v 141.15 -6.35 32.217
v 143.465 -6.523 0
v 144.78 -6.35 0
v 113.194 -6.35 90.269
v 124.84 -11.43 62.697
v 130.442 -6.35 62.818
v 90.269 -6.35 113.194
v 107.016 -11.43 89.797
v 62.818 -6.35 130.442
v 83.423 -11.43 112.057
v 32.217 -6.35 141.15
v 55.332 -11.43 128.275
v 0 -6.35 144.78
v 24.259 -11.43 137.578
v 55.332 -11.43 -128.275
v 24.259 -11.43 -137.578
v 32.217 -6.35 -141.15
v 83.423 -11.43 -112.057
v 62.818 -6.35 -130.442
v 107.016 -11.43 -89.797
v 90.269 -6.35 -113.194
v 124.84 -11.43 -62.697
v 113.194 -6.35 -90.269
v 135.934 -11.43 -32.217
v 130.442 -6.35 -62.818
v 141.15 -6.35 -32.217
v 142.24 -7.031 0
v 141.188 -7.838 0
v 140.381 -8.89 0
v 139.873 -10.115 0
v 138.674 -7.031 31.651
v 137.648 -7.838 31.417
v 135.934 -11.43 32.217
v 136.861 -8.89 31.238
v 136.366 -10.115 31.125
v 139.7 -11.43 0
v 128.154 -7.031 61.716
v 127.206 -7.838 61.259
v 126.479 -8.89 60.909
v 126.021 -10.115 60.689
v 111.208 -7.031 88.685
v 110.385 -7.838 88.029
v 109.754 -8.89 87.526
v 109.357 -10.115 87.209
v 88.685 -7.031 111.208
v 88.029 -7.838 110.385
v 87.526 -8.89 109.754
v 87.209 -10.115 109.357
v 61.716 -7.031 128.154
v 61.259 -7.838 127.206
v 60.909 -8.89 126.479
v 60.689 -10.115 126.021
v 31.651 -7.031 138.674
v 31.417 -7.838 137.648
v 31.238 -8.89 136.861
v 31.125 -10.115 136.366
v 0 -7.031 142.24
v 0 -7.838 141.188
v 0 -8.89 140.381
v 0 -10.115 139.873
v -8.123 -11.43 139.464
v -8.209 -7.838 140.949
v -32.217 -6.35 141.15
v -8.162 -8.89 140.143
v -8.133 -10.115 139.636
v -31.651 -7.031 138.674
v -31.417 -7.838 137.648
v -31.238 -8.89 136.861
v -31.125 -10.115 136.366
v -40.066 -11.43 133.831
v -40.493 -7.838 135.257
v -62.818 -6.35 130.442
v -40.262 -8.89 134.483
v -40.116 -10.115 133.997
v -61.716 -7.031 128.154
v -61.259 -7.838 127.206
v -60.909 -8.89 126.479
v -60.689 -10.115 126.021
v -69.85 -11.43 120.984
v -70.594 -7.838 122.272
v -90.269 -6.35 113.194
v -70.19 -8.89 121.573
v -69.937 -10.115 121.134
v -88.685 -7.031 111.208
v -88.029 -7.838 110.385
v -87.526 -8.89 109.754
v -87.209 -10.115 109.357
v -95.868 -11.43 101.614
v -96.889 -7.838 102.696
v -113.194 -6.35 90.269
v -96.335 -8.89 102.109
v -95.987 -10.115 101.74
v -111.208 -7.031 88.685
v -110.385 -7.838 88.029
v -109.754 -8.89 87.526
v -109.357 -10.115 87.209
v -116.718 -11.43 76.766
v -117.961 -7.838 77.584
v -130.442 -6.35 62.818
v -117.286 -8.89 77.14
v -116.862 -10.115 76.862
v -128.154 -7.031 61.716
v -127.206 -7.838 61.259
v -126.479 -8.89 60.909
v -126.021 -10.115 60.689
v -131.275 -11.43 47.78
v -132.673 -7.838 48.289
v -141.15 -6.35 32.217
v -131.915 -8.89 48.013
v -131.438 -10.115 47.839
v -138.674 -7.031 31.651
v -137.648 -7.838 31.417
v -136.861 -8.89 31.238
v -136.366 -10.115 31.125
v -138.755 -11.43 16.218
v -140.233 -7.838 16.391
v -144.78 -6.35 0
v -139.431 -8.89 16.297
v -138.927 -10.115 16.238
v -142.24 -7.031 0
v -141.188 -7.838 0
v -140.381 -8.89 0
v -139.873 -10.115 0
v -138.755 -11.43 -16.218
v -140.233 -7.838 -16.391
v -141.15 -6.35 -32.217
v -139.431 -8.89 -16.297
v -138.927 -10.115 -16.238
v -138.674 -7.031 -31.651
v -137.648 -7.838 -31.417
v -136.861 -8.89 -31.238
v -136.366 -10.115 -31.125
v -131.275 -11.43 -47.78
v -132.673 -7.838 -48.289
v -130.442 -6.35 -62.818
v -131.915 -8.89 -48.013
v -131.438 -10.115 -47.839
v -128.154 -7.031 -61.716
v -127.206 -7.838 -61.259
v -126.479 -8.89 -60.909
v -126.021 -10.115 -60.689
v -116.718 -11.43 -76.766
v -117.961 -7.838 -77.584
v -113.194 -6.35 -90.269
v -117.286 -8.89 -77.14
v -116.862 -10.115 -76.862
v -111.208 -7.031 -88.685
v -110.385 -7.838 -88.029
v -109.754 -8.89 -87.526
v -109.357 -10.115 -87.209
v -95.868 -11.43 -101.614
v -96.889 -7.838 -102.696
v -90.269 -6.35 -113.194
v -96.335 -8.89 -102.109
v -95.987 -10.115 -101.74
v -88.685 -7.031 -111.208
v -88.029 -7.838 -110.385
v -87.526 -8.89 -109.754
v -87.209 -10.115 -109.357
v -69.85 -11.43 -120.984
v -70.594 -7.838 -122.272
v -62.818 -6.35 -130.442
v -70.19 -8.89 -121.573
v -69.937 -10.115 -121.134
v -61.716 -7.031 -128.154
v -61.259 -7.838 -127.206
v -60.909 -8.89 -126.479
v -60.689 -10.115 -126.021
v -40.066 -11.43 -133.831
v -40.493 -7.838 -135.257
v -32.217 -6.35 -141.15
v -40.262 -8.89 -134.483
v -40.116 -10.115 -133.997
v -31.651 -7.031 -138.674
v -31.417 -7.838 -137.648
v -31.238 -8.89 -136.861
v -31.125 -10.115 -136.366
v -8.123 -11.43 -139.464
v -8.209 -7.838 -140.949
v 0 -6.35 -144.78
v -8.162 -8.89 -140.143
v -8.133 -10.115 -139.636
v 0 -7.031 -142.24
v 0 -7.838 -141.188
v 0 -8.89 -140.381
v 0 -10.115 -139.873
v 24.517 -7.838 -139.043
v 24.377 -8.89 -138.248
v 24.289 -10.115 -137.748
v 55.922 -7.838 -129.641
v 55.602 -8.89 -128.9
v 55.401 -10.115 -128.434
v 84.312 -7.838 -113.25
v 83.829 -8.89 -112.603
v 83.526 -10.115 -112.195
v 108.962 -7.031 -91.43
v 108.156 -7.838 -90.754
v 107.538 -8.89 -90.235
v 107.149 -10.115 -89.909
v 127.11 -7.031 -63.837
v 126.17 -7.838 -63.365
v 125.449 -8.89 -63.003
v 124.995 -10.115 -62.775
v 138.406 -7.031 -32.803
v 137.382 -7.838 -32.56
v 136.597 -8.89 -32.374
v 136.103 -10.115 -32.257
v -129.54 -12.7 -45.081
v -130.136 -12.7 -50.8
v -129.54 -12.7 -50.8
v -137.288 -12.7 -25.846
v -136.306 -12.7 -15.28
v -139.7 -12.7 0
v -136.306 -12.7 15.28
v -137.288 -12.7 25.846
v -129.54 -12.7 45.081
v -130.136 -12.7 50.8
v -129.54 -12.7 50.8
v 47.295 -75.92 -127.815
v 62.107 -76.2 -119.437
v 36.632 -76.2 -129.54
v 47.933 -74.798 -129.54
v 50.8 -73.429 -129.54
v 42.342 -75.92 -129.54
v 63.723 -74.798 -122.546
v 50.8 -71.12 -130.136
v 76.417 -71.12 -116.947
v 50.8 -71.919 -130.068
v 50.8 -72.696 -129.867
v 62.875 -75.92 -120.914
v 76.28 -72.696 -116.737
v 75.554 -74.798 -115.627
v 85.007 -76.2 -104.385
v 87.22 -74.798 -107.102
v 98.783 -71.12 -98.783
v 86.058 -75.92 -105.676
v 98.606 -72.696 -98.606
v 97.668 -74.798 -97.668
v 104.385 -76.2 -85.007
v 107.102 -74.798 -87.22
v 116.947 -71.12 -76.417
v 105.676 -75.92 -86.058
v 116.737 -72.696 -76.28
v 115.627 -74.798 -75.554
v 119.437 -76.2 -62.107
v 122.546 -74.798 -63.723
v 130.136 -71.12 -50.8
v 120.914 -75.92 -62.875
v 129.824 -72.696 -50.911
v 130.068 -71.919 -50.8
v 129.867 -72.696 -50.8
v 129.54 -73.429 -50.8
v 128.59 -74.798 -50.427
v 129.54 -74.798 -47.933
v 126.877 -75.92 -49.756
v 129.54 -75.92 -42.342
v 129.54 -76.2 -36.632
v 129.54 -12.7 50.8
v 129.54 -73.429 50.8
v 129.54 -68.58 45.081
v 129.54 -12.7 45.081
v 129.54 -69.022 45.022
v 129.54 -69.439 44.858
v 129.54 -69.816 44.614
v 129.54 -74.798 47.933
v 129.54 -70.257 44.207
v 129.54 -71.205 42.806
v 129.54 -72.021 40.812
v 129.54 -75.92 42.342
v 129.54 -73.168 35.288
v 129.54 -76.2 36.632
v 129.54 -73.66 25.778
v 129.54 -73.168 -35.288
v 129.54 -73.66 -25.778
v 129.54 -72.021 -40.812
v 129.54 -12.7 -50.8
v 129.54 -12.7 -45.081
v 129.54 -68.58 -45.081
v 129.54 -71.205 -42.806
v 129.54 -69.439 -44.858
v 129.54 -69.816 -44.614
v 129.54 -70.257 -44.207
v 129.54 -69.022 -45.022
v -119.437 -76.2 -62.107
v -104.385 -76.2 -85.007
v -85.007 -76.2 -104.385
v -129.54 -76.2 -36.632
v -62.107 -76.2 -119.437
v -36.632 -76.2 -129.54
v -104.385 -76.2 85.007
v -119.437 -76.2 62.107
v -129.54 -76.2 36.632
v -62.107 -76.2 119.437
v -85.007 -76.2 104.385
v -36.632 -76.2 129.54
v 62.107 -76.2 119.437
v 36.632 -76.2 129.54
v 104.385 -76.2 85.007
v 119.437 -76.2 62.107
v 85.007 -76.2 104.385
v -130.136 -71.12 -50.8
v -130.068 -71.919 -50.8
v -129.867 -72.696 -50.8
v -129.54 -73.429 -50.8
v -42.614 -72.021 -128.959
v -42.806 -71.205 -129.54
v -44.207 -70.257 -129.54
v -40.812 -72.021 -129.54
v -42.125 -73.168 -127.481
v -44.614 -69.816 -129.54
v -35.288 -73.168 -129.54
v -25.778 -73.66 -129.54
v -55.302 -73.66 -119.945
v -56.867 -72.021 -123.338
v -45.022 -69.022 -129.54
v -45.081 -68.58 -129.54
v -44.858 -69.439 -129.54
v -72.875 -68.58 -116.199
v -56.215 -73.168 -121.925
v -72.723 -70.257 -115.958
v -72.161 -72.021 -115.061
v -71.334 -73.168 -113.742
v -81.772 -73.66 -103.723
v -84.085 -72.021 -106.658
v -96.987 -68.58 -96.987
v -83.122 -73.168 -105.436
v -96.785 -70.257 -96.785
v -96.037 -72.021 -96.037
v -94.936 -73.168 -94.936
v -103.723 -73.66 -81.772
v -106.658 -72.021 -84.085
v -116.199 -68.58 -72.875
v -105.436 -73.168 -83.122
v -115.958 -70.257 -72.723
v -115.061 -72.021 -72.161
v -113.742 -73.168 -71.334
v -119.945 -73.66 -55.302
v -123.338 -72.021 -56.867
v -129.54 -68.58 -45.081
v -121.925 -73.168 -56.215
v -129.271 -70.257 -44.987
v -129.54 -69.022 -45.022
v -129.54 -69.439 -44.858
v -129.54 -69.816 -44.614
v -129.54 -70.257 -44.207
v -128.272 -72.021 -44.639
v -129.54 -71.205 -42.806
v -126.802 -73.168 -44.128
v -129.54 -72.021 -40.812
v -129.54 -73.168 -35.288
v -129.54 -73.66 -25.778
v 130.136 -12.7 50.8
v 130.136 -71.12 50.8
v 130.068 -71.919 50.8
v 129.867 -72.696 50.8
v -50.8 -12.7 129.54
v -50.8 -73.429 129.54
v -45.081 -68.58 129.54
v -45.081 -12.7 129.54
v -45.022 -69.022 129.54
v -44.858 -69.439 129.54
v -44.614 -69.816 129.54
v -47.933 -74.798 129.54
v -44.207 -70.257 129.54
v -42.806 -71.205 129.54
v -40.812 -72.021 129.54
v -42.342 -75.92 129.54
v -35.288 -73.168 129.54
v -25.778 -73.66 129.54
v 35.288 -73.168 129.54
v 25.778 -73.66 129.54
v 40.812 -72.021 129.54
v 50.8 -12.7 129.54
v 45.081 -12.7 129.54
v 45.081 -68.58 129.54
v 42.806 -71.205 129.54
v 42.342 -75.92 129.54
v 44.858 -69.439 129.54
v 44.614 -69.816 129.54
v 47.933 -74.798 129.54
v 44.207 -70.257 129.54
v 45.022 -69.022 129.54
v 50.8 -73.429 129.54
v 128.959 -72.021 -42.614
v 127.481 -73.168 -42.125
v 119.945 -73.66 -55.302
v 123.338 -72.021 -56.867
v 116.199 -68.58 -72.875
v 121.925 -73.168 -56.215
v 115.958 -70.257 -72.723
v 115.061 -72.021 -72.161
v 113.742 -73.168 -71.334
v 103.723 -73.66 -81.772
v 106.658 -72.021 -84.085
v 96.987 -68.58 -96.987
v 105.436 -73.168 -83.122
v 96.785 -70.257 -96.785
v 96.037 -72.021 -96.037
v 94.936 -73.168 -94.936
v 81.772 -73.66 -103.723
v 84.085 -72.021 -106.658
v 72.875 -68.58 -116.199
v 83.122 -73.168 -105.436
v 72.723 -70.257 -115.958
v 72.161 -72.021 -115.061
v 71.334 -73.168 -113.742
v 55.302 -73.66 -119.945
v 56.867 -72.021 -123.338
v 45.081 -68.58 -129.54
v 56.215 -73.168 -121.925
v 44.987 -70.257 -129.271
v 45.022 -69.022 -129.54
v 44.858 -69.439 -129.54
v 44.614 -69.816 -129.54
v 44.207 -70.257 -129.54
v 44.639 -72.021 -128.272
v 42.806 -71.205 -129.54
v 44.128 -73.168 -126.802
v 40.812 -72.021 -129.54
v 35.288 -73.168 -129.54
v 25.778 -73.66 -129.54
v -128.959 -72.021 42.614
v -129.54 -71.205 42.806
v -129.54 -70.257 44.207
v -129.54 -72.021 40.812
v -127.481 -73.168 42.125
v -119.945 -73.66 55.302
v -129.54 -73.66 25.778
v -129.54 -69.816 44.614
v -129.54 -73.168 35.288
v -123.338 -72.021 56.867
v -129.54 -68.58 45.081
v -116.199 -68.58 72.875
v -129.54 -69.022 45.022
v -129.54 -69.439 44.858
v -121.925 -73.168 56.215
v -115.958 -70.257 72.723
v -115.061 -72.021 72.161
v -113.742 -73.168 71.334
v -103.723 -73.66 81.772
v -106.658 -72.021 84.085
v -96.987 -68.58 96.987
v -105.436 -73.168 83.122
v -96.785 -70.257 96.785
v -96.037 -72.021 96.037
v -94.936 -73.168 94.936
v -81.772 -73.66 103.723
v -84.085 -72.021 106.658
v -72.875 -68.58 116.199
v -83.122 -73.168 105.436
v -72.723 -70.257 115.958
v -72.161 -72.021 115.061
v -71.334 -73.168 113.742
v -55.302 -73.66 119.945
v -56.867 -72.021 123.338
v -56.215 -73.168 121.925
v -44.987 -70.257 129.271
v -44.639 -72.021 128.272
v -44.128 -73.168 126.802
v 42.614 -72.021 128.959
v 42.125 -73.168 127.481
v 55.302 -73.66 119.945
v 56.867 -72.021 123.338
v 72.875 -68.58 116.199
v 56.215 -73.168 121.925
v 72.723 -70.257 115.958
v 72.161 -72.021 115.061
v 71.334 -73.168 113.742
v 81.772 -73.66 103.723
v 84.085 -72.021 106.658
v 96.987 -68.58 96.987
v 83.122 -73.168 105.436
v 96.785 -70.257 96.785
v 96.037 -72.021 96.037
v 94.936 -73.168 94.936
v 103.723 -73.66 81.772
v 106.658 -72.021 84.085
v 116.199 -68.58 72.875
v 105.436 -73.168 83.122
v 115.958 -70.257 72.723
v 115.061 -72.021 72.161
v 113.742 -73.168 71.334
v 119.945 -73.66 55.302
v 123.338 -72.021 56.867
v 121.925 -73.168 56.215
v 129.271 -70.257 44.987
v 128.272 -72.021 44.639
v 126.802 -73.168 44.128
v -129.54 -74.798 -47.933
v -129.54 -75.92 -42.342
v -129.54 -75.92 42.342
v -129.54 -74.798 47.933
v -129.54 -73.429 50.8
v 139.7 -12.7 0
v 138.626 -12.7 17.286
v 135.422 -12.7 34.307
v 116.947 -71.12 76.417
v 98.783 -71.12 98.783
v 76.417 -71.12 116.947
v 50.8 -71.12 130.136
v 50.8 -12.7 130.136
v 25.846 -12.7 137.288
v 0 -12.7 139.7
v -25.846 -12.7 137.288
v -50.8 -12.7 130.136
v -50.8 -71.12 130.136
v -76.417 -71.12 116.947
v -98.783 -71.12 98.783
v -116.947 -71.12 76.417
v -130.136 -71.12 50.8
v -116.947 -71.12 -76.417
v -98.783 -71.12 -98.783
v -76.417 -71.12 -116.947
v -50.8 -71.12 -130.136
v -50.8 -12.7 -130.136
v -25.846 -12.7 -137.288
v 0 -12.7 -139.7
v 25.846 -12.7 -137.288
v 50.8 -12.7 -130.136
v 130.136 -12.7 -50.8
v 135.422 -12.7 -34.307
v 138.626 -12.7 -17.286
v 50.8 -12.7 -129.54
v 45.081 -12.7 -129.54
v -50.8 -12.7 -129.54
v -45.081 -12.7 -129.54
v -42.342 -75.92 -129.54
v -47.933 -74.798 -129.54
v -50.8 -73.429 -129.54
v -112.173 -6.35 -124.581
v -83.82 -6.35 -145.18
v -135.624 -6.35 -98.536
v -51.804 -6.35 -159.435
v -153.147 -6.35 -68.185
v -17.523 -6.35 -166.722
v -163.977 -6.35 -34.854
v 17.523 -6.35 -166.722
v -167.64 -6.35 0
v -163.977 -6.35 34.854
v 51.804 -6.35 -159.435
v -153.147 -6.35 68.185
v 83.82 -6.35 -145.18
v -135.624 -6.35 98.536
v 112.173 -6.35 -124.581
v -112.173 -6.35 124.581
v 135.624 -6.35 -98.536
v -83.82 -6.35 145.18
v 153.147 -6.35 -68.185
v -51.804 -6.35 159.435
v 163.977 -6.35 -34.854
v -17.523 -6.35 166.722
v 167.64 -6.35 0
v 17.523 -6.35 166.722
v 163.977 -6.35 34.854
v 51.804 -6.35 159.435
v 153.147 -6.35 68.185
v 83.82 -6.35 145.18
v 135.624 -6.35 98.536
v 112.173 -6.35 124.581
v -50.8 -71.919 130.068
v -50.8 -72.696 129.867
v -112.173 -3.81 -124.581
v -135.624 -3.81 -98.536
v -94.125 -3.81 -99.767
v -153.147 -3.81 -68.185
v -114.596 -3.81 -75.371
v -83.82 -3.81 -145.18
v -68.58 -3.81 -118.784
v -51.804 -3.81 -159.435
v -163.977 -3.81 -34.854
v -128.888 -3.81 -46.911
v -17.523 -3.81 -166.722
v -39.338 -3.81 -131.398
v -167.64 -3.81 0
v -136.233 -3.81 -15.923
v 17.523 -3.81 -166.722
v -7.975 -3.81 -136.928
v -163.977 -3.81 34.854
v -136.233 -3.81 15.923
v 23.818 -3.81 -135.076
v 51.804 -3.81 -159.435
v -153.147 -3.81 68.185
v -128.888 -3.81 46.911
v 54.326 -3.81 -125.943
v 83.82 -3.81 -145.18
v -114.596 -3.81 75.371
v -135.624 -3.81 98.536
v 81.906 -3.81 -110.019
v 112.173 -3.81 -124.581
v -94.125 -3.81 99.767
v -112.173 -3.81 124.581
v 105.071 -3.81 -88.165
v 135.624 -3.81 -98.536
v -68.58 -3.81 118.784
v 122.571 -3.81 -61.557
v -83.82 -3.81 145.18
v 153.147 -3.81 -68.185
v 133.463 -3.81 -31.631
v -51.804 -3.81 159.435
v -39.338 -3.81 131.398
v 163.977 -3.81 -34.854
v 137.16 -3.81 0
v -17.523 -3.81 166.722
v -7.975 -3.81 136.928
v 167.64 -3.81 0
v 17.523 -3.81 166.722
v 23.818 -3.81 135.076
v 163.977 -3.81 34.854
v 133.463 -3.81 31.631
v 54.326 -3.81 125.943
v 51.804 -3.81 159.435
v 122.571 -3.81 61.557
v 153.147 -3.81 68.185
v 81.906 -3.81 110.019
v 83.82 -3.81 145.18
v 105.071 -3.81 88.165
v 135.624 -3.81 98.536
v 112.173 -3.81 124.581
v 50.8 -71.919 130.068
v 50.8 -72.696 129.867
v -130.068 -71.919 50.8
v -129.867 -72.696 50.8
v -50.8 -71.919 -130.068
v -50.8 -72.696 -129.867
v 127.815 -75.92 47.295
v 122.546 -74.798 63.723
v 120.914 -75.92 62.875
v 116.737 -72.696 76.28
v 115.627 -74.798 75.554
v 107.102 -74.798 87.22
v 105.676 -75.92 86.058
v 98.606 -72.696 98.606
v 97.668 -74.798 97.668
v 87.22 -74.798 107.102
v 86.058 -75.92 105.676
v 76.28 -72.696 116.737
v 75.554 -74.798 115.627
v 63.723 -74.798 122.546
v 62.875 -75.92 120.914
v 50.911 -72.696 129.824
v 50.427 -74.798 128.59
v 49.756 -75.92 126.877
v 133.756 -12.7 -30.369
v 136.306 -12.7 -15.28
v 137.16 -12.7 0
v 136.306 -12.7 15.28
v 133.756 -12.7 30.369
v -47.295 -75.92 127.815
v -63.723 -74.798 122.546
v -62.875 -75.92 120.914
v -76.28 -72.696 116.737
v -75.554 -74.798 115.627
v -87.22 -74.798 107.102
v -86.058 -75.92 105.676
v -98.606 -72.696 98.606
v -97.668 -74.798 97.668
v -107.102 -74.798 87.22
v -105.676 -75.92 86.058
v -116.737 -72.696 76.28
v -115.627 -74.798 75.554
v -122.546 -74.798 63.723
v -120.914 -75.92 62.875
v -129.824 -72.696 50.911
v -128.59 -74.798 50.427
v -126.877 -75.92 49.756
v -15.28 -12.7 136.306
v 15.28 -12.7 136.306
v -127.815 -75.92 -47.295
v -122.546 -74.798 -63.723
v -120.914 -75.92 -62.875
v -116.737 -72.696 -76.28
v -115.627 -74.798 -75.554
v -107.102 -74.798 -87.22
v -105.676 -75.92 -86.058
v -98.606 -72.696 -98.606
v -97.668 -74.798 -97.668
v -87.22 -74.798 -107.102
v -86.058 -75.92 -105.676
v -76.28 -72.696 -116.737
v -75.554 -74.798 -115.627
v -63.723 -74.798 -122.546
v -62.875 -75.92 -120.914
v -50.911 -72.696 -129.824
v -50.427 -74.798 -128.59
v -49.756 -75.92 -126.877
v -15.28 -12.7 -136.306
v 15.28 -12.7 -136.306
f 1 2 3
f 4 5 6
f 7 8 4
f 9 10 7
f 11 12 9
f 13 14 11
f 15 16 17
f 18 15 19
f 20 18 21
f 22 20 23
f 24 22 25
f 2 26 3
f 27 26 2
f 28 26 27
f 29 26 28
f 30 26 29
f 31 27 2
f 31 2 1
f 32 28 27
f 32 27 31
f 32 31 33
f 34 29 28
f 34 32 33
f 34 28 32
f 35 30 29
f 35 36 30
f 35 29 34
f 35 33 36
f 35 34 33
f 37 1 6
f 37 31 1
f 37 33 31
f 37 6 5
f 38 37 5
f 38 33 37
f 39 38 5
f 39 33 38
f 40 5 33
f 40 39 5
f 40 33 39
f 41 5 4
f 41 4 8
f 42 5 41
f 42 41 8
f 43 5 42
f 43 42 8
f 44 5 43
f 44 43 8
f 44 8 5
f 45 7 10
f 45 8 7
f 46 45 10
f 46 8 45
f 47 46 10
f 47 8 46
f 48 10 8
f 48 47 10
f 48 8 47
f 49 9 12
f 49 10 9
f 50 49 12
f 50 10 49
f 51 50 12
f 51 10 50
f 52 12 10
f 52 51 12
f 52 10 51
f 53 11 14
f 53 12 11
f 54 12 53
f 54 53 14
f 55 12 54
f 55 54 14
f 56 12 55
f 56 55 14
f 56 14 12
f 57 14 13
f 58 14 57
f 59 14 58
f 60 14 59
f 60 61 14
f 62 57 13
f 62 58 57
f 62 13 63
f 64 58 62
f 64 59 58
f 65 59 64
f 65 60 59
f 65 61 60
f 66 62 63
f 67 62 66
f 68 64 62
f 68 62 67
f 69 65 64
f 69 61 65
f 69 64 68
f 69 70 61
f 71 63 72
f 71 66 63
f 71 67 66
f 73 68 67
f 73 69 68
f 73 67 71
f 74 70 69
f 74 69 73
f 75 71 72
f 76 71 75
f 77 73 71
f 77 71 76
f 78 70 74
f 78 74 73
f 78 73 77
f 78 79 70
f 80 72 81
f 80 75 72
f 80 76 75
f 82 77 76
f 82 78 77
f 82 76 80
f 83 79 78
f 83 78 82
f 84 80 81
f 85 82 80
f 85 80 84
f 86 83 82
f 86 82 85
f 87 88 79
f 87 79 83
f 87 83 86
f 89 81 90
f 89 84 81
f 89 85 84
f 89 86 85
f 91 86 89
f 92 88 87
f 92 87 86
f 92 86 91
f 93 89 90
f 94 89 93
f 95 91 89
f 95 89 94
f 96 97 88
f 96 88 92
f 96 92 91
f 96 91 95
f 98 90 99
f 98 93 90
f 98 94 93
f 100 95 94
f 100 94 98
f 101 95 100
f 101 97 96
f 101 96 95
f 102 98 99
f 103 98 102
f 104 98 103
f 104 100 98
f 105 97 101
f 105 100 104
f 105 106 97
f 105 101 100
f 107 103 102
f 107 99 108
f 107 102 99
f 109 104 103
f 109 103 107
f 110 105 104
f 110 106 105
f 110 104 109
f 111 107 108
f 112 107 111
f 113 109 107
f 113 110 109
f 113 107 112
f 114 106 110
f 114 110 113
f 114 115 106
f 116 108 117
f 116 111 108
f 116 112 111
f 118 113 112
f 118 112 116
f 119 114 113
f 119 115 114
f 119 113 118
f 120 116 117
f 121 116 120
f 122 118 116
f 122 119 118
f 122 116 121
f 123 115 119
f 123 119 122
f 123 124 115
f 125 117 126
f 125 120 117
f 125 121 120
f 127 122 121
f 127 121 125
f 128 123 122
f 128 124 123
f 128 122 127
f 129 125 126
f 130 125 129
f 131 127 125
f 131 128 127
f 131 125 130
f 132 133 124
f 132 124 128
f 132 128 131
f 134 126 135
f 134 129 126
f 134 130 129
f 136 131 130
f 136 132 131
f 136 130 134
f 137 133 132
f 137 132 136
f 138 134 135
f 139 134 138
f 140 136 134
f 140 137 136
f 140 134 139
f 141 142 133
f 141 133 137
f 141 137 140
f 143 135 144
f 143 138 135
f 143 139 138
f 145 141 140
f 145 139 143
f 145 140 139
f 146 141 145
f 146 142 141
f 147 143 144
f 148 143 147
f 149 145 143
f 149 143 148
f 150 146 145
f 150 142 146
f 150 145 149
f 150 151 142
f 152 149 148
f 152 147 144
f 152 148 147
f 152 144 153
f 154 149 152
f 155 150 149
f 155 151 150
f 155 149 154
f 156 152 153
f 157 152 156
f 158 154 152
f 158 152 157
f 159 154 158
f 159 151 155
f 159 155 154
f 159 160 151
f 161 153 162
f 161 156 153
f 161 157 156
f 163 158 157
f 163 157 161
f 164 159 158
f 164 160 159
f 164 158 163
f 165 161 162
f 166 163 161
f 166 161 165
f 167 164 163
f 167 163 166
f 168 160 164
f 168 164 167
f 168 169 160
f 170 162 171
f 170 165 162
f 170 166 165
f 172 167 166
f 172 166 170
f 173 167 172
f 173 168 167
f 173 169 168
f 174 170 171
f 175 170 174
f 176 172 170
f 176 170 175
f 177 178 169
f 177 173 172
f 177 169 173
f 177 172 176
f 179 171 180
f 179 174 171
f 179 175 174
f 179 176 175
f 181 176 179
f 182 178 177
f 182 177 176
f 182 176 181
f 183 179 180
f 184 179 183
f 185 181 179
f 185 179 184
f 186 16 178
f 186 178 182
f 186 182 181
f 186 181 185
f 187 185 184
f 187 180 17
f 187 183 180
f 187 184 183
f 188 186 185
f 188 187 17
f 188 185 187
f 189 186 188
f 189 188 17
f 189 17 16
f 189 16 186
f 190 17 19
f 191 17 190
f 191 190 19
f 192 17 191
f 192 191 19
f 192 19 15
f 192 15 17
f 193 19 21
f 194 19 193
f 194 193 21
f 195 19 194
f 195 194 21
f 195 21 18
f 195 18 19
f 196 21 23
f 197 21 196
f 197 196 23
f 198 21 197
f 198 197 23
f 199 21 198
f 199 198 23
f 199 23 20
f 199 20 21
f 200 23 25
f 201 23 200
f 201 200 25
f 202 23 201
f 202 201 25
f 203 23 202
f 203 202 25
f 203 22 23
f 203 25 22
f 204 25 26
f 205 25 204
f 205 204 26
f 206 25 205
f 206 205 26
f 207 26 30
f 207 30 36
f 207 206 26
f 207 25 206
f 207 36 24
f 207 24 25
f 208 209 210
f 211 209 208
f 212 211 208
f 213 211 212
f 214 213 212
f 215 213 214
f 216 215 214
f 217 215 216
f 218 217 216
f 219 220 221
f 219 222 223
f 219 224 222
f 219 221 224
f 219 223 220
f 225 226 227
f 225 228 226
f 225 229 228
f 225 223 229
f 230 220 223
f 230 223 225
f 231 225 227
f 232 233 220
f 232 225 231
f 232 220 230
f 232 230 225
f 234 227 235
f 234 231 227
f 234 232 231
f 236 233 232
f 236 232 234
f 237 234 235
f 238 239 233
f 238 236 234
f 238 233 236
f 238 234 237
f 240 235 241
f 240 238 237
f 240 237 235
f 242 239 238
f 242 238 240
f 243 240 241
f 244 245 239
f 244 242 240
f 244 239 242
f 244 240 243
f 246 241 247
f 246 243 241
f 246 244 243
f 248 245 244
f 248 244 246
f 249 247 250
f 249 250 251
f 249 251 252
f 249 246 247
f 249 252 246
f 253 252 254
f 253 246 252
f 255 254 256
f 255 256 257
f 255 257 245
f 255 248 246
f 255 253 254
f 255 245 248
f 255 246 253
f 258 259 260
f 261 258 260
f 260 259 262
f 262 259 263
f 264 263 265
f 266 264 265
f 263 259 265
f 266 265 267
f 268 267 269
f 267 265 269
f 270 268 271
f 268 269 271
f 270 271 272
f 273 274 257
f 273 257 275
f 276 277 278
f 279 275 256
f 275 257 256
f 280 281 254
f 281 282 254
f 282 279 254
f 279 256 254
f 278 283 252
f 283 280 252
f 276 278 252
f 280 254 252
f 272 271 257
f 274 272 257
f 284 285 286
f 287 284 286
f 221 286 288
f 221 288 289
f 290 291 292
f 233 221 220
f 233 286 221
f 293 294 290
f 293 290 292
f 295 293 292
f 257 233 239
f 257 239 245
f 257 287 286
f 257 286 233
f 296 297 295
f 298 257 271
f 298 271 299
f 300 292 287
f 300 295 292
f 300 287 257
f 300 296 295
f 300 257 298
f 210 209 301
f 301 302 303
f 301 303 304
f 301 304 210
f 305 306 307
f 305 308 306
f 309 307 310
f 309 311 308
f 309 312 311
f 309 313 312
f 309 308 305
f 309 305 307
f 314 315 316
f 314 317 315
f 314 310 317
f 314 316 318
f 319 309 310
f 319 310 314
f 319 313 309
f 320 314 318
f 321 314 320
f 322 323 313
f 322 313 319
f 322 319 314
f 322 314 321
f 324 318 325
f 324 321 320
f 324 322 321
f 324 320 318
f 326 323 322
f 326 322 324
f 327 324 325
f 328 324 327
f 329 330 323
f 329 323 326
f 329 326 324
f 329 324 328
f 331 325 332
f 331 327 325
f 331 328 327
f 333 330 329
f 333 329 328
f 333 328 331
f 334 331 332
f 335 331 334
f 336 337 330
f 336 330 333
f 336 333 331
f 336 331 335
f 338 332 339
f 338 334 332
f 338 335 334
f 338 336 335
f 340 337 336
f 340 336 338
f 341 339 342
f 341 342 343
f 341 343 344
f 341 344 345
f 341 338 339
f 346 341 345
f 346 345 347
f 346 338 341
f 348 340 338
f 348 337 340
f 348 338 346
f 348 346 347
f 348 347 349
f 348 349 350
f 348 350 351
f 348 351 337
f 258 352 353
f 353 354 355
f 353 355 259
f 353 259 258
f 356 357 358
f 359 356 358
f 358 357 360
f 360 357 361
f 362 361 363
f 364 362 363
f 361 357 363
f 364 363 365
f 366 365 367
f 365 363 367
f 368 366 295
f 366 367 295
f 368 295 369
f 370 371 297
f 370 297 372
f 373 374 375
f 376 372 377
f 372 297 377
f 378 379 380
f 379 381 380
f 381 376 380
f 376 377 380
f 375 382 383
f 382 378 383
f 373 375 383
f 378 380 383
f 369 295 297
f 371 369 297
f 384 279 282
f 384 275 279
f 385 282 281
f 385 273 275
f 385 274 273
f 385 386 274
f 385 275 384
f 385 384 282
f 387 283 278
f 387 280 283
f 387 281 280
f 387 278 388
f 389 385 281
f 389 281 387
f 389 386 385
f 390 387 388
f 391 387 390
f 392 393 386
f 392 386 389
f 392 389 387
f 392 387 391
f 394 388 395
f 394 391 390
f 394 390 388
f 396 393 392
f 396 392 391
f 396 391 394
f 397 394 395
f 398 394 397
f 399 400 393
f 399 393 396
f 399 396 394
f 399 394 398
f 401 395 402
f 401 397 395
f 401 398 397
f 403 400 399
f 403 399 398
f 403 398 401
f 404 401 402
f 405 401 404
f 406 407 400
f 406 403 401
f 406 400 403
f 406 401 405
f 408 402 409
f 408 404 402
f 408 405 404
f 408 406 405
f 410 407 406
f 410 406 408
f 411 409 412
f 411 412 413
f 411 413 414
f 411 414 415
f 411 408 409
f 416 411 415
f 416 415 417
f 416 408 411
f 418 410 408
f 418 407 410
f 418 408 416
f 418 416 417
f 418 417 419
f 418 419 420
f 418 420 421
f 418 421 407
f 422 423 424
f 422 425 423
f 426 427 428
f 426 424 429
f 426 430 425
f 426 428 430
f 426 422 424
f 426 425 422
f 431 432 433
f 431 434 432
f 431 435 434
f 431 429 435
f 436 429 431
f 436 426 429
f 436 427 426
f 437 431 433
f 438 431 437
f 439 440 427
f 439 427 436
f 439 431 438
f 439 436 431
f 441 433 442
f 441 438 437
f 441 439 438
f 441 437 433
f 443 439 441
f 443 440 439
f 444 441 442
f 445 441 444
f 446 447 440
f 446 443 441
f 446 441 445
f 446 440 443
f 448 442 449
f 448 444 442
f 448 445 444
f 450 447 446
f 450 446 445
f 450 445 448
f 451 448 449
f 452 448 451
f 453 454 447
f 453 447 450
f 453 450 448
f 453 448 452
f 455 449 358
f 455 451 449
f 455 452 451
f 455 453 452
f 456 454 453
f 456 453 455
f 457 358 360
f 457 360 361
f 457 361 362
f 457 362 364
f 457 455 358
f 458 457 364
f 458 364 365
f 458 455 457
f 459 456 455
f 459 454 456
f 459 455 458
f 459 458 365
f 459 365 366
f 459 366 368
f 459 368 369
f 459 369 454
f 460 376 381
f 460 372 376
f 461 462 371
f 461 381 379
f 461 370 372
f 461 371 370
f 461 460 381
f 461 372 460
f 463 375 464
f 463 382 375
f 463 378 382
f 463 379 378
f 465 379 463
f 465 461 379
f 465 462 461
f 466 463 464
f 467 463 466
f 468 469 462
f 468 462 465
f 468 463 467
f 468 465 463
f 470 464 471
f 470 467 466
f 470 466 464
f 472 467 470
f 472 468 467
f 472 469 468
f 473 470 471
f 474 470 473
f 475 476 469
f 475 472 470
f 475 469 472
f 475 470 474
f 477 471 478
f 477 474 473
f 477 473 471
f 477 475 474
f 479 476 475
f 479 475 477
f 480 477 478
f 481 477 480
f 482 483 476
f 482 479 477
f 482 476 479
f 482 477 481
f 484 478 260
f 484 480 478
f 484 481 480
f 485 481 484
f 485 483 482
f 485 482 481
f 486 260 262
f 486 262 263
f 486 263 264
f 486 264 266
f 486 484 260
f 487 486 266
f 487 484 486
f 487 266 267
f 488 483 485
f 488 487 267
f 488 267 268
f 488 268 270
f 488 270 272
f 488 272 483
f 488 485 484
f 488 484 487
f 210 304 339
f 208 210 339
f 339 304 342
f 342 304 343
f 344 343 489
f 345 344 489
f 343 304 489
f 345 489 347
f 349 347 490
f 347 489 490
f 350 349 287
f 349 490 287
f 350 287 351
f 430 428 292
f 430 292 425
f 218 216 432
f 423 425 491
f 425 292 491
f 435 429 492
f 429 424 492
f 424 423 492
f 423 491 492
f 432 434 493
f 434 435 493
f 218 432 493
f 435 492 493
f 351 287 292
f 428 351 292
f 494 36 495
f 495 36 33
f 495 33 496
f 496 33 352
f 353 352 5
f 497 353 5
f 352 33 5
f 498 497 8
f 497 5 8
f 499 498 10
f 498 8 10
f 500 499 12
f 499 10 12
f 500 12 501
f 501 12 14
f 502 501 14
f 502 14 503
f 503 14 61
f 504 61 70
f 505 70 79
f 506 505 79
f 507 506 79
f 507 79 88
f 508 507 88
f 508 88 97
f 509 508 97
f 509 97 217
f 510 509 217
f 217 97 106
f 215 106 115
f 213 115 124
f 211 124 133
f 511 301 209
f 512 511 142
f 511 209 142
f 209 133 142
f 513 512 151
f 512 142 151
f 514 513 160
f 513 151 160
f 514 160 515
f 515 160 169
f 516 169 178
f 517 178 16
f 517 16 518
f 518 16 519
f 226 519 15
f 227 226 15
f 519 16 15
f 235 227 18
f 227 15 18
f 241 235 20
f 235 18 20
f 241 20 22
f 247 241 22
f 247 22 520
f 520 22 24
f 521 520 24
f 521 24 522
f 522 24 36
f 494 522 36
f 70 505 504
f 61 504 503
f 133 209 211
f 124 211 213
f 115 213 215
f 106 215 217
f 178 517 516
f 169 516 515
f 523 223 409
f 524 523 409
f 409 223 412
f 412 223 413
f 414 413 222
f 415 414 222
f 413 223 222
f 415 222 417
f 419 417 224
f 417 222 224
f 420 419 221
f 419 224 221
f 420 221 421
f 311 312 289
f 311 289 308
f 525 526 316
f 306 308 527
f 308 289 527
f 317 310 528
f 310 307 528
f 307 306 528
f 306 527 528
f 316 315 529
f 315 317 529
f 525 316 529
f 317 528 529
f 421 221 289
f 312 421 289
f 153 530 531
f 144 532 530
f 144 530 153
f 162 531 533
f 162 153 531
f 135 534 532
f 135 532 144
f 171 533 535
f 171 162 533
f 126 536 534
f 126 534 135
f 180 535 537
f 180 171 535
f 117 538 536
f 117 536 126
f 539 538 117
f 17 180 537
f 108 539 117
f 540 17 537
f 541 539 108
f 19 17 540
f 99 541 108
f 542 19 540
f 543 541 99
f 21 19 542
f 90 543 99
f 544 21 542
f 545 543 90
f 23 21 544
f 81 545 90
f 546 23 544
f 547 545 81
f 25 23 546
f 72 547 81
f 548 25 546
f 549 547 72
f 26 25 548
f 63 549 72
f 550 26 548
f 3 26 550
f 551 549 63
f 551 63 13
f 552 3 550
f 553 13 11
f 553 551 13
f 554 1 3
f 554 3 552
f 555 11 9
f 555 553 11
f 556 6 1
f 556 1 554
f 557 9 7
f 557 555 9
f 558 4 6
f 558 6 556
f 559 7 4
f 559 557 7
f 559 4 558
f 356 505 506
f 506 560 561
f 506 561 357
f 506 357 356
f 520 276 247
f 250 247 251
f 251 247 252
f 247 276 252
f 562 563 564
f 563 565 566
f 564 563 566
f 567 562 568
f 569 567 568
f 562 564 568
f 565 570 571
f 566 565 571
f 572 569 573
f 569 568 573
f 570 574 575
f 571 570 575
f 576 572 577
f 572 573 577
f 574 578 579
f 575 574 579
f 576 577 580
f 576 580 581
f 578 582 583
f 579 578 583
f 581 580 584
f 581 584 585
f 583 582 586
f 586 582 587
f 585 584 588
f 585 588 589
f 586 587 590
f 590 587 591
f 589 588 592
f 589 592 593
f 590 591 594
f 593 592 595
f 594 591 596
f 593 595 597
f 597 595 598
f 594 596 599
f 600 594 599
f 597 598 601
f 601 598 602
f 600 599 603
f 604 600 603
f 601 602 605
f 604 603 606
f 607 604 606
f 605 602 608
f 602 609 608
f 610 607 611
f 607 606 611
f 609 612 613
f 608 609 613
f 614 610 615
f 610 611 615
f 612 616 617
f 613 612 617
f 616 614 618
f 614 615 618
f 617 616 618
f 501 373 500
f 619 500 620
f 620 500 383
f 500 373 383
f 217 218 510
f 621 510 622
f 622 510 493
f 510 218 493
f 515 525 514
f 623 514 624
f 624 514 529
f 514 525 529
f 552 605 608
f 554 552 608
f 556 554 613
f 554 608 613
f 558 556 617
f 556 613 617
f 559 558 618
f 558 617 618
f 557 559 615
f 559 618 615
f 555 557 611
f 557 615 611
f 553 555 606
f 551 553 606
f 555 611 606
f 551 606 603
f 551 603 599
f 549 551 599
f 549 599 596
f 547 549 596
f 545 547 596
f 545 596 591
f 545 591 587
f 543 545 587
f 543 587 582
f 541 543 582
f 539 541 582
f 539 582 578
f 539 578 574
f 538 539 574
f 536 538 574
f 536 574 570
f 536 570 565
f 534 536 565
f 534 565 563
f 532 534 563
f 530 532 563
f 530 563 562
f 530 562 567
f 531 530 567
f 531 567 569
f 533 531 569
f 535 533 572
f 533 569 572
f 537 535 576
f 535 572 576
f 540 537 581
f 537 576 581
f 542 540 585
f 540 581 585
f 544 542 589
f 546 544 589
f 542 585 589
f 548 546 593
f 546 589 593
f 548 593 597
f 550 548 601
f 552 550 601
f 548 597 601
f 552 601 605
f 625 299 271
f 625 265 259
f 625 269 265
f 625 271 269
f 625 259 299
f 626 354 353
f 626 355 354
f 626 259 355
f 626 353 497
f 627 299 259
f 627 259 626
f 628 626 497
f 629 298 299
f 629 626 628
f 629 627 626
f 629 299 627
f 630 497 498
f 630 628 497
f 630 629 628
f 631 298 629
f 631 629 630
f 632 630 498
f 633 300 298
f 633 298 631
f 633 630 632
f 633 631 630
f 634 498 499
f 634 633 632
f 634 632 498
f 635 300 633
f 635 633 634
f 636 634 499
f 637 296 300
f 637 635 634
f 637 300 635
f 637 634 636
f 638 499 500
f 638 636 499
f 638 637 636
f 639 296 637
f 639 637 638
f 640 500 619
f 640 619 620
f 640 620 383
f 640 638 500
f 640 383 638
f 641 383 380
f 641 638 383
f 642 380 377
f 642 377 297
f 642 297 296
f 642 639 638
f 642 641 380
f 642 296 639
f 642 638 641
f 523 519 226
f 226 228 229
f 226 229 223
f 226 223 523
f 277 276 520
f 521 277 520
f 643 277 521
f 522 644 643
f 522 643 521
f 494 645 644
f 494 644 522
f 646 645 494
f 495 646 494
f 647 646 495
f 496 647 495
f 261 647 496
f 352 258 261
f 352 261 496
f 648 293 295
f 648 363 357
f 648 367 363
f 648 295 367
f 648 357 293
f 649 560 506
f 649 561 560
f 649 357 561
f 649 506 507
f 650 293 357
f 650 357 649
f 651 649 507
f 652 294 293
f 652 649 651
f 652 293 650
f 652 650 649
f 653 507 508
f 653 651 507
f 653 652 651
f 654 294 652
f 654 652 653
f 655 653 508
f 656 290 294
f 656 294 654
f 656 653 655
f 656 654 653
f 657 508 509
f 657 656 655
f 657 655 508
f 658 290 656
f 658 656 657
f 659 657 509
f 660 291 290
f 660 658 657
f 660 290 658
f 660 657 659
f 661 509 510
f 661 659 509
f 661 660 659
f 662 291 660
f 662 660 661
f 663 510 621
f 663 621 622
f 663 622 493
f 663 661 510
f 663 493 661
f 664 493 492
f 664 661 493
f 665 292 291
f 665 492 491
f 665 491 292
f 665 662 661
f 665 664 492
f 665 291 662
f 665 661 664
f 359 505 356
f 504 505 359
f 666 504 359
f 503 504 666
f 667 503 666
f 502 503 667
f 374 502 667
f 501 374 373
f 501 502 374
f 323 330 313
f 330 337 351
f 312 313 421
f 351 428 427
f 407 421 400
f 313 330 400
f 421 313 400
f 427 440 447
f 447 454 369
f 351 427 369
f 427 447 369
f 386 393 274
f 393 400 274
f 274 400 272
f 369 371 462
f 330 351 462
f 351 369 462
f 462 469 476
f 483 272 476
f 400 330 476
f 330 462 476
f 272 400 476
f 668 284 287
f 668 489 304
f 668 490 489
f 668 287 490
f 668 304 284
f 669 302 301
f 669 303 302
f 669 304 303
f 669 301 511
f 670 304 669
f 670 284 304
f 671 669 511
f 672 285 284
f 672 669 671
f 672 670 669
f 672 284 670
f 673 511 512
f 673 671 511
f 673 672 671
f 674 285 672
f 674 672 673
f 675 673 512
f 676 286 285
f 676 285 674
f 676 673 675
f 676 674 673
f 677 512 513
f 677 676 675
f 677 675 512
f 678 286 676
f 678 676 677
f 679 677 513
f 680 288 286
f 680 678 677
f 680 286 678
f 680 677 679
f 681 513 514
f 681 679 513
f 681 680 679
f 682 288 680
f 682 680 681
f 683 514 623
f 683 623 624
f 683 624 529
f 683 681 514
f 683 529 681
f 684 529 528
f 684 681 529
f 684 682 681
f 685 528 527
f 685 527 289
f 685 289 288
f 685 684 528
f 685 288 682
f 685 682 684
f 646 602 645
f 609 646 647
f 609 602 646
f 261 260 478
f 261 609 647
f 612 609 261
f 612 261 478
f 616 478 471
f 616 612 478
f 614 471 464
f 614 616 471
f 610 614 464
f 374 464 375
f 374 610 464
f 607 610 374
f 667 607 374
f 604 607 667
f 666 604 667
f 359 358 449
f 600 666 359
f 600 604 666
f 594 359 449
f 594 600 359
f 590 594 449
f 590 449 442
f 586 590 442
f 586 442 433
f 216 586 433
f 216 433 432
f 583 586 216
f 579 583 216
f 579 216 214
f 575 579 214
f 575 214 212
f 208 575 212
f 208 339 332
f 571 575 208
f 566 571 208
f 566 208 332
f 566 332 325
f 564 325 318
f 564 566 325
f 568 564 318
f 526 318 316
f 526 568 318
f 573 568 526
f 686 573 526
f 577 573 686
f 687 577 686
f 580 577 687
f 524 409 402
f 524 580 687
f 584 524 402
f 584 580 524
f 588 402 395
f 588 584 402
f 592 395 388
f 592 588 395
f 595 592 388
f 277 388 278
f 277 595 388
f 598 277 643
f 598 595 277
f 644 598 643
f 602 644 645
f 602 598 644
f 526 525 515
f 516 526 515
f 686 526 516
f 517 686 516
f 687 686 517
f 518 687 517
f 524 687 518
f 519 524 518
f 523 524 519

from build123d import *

# Parameters (mm, degrees)
F0_R     = 139.7
F0_R_2   = 138.43
F1_DEPTH = 76.2
F0_R_3   = 167.64
F2_DEPTH = 6.35
F3_T     = -2.54
F4_DEPTH = 3.81
F5_R     = 5.08
F7_DEPTH = 63.5


with BuildPart() as f1:
    # F0 (on Front) → F1 (new body)
    with BuildSketch(Plane.XZ):
        Circle(F0_R)
        Circle(F0_R_2, mode=Mode.SUBTRACT)
        Circle(F0_R_2)
    extrude(amount=F1_DEPTH)

    # F0 (on Front) → F2 (join)
    with BuildSketch(Plane.XZ):
        Circle(F0_R_3)
        Circle(F0_R, mode=Mode.SUBTRACT)
    extrude(amount=F2_DEPTH)

    # F3
    f3_openings = [f1.faces().sort_by_distance(p)[0] for p in [
        (0, 0, 0),
    ]]
    offset(amount=F3_T, openings=f3_openings, kind=Kind.INTERSECTION)

    # F0 (on Front) → F4 (cut)
    with BuildSketch(Plane.XZ):
        Circle(F0_R_3)
        Circle(F0_R, mode=Mode.SUBTRACT)
    extrude(amount=F4_DEPTH, mode=Mode.SUBTRACT)

    # F5
    f5_edges = [f1.edges().sort_by_distance(p)[0] for p in [
        (-139.7, -76.2, 0),
        (-139.7, -6.35, 0),
        (-137.16, -73.66, 0),
    ]]
    fillet(f5_edges, radius=F5_R)

    # F6 (on face) → F7 (cut)
    with BuildSketch(Plane.XZ.offset(76.2)):
        with BuildLine():
            Line((-139.7, -50.8), (-129.54, -50.8))
            Line((-129.54, -50.8), (-129.54, -36.6324009587))
            ThreePointArc((-129.54, -36.6324009587), (-134.62, 0), (-129.54, 36.6324009587))
            Line((-129.54, 36.6324009587), (-129.54, 50.8))
            Line((-129.54, 50.8), (-139.7, 50.8))
            Line((-139.7, 50.8), (-139.7, -50.8))
        make_face()
        with BuildLine():
            ThreePointArc((134.62, 0), (133.3439522438, -18.4914791188), (129.54, -36.6324009587))
            Line((129.54, -36.6324009587), (129.54, -50.8))
            Line((129.54, -50.8), (139.7, -50.8))
            Line((139.7, -50.8), (139.7, 50.8))
            Line((139.7, 50.8), (129.54, 50.8))
            Line((129.54, 50.8), (129.54, 36.6324009587))
            ThreePointArc((129.54, 36.6324009587), (133.3439522438, 18.4914791188), (134.62, 0))
        make_face()
        with BuildLine():
            ThreePointArc((-129.54, 36.6324009587), (-134.62, 0), (-129.54, -36.6324009587))
            Line((-129.54, -36.6324009587), (-129.54, 36.6324009587))
        make_face()
        with BuildLine():
            Line((129.54, 36.6324009587), (129.54, -36.6324009587))
            ThreePointArc((129.54, -36.6324009587), (133.3439522438, -18.4914791188), (134.62, 0))
            ThreePointArc((134.62, 0), (133.3439522438, 18.4914791188), (129.54, 36.6324009587))
        make_face()
        with BuildLine():
            Line((-50.8, 129.54), (-36.6324009587, 129.54))
            ThreePointArc((-36.6324009587, 129.54), (0, 134.62), (36.6324009587, 129.54))
            Line((36.6324009587, 129.54), (50.8, 129.54))
            Line((50.8, 129.54), (50.8, 139.7))
            Line((50.8, 139.7), (-50.8, 139.7))
            Line((-50.8, 139.7), (-50.8, 129.54))
        make_face()
        with BuildLine():
            ThreePointArc((36.6324009587, 129.54), (0, 134.62), (-36.6324009587, 129.54))
            Line((-36.6324009587, 129.54), (36.6324009587, 129.54))
        make_face()
        with BuildLine():
            Line((36.6324009587, -129.54), (-36.6324009587, -129.54))
            ThreePointArc((-36.6324009587, -129.54), (0, -134.62), (36.6324009587, -129.54))
        make_face()
        with BuildLine():
            ThreePointArc((36.6324009587, -129.54), (0, -134.62), (-36.6324009587, -129.54))
            Line((-36.6324009587, -129.54), (-50.8, -129.54))
            Line((-50.8, -129.54), (-50.8, -139.7))
            Line((-50.8, -139.7), (50.8, -139.7))
            Line((50.8, -139.7), (50.8, -129.54))
            Line((50.8, -129.54), (36.6324009587, -129.54))
        make_face()
    extrude(amount=-F7_DEPTH, mode=Mode.SUBTRACT)


solid = f1.part
